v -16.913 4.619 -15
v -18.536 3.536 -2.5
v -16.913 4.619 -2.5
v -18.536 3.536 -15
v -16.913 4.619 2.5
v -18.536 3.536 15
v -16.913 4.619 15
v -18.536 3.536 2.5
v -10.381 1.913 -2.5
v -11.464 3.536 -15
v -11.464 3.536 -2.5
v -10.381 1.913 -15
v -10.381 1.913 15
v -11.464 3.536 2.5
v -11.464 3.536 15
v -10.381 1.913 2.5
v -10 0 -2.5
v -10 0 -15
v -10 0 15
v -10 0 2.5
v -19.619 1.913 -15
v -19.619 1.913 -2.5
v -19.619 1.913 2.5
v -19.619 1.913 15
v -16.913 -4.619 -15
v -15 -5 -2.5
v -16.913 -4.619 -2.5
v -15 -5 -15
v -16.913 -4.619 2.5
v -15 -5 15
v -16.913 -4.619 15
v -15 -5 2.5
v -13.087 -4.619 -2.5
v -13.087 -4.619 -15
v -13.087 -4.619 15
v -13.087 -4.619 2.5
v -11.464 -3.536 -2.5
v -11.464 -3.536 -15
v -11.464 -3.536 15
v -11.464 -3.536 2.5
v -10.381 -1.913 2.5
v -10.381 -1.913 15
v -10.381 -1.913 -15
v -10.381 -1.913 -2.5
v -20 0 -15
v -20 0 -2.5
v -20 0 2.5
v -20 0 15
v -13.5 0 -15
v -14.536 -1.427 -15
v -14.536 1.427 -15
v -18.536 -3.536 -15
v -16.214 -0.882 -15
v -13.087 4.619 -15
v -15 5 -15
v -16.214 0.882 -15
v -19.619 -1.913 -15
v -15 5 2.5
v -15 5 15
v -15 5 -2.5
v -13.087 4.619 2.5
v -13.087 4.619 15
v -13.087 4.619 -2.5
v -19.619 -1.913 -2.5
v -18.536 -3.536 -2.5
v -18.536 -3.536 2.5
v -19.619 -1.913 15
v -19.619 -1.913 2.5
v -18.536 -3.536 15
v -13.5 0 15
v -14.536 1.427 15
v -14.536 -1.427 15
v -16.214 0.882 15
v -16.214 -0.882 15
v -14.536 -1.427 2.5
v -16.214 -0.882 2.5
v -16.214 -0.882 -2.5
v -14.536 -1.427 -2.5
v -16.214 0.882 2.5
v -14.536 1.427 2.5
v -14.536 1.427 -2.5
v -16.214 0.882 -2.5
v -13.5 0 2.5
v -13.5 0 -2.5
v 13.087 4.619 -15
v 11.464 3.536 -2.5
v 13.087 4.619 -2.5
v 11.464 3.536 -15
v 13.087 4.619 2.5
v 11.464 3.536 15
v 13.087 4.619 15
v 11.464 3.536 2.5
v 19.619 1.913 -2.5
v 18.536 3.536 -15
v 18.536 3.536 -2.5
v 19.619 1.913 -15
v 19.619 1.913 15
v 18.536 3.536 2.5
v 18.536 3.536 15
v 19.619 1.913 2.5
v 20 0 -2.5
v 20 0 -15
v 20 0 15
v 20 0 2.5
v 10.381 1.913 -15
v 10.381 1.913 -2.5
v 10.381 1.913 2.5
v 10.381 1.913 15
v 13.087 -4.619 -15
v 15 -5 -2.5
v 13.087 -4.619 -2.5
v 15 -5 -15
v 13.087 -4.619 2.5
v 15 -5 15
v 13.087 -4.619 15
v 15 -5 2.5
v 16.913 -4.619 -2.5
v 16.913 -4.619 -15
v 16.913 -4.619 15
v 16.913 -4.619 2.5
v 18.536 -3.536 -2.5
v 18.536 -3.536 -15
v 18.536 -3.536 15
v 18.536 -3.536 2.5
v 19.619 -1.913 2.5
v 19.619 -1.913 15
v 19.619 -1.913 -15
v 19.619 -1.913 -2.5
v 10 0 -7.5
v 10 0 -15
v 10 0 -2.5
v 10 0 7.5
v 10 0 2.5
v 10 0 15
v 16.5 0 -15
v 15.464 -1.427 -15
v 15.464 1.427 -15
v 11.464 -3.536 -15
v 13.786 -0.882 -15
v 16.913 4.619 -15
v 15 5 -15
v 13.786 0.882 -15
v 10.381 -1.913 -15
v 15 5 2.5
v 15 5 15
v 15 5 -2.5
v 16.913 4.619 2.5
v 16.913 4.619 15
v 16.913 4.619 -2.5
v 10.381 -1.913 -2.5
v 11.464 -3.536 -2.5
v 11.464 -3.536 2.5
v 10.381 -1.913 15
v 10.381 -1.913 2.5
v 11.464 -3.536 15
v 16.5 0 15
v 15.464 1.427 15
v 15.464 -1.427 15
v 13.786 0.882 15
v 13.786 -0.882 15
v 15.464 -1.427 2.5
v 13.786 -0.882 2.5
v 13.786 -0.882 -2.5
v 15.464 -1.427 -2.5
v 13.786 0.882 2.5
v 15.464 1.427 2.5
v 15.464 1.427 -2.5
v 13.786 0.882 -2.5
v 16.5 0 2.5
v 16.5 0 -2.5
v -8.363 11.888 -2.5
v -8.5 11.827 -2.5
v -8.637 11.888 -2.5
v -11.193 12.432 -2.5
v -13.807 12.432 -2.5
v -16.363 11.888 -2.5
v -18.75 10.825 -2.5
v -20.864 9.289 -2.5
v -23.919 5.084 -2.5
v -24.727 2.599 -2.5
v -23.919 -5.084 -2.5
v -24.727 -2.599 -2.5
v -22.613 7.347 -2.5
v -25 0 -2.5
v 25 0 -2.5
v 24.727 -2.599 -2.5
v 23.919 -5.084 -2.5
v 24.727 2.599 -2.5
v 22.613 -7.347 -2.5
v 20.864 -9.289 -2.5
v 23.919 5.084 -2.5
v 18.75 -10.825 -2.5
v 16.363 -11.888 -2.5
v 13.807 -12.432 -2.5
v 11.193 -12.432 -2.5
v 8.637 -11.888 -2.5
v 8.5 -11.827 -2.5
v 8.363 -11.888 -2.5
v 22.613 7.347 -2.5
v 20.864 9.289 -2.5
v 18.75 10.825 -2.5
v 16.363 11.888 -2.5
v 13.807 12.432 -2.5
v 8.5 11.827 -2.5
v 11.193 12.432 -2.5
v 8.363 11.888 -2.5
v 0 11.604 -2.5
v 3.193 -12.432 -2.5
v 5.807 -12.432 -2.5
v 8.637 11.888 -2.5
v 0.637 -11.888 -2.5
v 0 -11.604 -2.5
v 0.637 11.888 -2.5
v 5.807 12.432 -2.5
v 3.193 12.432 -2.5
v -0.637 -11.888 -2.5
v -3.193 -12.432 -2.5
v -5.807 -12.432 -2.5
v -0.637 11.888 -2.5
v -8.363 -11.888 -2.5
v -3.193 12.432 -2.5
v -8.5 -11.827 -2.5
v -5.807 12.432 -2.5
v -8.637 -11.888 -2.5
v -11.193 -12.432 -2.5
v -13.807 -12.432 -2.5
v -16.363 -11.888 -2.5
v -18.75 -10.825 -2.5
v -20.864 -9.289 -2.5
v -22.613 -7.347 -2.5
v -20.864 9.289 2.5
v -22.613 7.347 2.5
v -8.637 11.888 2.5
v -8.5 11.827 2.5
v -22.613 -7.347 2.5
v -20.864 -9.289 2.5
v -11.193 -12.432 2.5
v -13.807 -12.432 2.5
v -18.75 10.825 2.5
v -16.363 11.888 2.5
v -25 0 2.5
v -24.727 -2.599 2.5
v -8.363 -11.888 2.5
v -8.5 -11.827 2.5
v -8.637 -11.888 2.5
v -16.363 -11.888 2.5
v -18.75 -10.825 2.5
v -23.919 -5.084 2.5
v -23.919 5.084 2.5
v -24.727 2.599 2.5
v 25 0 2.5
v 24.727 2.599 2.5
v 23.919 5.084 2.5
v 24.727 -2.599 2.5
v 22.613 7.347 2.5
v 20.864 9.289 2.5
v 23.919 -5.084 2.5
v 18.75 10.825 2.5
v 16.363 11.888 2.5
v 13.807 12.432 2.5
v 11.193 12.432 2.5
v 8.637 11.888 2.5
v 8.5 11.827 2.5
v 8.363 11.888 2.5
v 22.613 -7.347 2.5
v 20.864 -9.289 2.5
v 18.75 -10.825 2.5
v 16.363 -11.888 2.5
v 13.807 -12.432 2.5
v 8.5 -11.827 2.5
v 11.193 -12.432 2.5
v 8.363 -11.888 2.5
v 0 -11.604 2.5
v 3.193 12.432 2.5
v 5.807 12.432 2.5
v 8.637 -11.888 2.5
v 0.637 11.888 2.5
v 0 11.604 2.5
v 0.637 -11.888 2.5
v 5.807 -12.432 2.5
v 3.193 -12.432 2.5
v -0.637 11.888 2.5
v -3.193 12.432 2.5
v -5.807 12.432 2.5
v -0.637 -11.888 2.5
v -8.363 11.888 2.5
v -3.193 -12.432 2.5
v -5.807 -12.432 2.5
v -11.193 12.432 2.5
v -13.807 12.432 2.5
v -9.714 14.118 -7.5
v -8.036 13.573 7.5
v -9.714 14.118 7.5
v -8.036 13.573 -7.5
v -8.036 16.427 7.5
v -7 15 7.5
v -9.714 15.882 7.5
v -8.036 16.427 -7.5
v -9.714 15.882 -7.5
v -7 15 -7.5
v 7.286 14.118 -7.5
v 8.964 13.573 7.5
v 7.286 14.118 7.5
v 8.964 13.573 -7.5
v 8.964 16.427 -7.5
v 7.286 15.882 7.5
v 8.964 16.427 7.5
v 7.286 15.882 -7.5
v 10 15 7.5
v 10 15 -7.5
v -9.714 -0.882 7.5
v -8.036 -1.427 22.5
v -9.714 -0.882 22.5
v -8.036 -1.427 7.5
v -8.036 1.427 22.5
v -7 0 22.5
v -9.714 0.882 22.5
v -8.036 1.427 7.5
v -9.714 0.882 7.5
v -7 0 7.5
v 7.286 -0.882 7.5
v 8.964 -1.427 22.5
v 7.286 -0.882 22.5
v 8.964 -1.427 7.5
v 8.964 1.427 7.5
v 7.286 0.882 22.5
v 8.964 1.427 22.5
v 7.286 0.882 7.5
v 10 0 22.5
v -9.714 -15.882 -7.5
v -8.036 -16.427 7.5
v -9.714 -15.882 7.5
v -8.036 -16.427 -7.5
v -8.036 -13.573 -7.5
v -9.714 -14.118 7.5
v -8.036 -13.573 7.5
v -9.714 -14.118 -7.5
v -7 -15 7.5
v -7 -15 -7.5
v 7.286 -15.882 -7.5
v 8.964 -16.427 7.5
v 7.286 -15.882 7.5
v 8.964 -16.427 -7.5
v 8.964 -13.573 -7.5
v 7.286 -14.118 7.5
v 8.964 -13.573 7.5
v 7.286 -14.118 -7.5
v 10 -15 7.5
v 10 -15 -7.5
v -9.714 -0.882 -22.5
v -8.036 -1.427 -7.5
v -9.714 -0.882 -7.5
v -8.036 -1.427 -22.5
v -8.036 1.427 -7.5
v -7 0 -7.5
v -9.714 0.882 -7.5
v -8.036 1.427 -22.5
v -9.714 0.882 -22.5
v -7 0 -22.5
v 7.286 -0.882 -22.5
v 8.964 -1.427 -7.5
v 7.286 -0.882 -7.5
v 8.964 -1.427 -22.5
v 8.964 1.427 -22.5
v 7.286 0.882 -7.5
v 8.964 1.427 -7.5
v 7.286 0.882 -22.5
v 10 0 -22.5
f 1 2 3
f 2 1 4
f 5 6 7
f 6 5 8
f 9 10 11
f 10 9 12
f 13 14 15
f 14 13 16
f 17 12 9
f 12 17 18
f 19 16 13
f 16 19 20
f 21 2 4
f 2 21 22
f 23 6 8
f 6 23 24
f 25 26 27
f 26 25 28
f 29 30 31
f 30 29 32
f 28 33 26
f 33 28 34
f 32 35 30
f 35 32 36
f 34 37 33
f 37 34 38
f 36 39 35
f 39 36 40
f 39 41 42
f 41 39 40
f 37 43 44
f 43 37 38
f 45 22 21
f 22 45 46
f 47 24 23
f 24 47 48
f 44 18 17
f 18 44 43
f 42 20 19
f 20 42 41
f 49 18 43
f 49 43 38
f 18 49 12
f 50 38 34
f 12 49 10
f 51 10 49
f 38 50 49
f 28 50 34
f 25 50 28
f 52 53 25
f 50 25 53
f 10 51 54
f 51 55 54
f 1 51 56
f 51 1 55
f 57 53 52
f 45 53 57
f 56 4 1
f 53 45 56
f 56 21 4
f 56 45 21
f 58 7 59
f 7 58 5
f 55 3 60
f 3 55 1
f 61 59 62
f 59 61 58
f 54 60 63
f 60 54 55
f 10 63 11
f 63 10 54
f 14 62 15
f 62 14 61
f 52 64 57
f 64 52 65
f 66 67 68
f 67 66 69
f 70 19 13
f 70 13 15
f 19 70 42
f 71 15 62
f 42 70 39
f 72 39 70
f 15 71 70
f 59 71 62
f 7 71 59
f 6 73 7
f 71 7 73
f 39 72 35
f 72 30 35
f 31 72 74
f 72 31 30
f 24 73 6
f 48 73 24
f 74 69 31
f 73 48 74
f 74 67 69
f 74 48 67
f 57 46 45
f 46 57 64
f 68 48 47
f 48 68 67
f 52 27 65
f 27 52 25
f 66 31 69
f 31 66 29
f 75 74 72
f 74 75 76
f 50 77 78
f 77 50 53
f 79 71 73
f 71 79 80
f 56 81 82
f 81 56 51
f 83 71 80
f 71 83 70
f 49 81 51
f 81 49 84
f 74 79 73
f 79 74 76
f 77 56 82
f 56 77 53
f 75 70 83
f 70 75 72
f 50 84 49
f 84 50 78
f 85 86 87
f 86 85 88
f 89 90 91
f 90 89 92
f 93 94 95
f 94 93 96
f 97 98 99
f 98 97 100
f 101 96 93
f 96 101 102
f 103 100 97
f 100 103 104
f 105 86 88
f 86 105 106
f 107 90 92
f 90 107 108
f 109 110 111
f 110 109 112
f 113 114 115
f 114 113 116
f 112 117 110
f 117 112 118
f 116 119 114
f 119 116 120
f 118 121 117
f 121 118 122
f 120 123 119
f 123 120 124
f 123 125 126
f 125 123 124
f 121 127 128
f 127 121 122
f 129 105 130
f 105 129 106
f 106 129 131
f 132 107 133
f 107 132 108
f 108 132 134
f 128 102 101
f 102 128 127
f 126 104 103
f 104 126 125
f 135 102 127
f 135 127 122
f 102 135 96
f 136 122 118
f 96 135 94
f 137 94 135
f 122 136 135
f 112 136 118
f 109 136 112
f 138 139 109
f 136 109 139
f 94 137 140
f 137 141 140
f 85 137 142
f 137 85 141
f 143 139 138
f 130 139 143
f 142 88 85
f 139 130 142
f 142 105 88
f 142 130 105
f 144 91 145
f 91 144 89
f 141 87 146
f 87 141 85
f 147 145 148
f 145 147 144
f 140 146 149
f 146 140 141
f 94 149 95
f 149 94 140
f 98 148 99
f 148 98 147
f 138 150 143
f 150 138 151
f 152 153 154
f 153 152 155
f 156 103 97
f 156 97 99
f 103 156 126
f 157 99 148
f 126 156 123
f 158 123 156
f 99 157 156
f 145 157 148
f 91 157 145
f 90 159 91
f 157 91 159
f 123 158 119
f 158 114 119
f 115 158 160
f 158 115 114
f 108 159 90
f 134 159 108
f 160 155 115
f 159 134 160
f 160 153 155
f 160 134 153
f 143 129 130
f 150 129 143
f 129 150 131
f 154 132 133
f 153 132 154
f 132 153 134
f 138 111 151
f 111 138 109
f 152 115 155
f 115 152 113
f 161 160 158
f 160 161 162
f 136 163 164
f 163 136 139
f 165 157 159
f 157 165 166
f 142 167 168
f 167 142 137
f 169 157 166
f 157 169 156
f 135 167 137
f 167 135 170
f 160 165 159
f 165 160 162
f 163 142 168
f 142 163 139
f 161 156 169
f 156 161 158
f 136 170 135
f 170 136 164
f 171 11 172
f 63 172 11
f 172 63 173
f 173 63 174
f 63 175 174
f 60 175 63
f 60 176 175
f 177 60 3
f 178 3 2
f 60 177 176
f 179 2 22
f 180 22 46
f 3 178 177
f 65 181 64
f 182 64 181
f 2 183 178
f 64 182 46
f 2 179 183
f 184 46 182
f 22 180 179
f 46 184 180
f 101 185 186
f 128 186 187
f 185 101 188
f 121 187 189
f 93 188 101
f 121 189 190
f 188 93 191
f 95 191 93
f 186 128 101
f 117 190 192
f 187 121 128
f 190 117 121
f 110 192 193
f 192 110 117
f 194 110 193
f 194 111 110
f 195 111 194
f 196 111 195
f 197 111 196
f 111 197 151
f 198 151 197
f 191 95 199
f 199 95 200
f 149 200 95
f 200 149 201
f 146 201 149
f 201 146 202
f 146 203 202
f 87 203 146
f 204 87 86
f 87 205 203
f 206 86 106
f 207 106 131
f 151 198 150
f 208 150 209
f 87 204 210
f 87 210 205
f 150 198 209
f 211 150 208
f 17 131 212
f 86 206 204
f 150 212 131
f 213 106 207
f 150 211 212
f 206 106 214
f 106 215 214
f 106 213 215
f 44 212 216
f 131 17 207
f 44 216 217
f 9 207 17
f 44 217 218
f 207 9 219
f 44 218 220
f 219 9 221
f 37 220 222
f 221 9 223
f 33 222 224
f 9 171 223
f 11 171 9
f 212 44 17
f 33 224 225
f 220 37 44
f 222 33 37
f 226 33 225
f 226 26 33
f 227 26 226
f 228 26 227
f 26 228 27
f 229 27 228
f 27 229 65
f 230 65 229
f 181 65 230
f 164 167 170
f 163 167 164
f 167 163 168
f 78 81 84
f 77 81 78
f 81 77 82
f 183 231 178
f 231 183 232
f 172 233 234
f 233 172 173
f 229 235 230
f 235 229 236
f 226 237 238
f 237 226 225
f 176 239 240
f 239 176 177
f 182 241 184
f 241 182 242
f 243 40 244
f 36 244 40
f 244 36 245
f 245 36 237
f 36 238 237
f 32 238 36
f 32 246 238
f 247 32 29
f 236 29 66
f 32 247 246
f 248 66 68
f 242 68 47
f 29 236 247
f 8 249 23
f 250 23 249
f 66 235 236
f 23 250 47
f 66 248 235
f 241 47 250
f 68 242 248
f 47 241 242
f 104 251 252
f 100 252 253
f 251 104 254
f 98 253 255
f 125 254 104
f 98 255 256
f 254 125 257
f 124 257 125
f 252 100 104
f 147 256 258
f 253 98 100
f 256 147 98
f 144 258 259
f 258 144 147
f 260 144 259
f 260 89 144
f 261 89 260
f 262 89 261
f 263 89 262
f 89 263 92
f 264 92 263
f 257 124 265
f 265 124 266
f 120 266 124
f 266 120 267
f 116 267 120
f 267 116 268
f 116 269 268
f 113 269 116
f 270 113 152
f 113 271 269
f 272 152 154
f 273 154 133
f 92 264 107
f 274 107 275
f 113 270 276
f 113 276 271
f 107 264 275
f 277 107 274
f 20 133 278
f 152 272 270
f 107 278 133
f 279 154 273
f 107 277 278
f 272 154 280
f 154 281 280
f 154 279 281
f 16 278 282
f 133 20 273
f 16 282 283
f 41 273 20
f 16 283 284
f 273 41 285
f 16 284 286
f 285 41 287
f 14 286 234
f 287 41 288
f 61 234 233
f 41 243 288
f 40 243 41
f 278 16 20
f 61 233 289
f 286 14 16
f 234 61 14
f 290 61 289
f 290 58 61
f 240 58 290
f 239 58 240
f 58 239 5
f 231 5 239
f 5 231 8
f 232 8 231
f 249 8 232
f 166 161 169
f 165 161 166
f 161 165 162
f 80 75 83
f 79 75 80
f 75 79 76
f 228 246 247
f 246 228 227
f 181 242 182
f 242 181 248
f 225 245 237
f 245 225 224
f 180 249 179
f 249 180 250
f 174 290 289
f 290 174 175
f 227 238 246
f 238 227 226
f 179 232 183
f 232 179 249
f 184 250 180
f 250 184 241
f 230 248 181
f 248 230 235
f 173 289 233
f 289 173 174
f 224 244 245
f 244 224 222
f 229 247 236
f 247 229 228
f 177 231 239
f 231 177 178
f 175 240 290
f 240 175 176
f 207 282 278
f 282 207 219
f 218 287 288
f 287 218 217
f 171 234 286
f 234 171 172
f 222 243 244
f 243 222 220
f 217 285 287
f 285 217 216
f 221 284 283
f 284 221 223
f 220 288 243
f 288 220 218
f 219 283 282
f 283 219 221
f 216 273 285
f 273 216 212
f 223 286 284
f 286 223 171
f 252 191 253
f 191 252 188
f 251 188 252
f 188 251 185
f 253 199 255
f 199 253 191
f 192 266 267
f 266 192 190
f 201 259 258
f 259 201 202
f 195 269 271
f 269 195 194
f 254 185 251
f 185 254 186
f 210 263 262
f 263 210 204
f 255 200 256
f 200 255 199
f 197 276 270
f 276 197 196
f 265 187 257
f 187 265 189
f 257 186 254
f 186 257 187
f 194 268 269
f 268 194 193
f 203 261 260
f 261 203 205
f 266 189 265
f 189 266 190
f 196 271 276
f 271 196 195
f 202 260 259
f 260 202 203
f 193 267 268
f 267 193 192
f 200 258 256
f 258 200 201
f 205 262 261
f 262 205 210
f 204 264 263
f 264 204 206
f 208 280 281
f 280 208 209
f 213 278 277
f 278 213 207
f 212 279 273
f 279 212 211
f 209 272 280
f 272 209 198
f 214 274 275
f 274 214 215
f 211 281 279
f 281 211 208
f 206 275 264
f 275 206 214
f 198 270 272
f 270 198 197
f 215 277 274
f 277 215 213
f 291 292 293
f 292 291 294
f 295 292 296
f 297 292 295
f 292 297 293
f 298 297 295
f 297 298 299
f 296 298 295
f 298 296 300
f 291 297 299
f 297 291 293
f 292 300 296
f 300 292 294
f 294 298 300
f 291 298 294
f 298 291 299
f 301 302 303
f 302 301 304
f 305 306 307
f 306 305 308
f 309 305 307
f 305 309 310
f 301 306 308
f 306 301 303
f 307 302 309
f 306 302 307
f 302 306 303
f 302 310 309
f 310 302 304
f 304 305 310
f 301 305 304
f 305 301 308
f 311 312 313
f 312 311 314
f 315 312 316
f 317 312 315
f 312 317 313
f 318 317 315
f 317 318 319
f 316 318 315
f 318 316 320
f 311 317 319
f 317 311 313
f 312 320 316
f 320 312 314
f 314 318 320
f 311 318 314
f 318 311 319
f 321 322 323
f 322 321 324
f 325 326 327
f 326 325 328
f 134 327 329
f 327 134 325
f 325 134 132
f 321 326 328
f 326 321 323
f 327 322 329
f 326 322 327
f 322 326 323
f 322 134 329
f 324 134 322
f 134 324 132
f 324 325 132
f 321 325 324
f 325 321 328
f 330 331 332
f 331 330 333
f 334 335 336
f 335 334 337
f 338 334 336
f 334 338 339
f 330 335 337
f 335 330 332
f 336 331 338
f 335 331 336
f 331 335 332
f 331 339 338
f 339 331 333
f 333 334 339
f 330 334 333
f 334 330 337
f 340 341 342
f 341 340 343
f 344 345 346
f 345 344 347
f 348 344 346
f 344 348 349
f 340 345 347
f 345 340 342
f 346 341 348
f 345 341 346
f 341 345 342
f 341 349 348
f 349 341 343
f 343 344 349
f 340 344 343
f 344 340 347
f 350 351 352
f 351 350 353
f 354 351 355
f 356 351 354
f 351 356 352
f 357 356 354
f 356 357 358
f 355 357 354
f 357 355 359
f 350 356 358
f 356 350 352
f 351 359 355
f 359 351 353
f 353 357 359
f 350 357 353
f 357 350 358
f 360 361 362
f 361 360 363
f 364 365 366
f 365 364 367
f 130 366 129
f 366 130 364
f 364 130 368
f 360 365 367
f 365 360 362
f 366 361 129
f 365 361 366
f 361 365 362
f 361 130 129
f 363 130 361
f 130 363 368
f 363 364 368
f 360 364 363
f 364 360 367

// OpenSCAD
// Parameters
shaft_diameter = 10;
shaft_length = 30;
flange_diameter = 25;
flange_thickness = 5;
spacer_diameter = 20;
spacer_thickness = 3;
bolt_diameter = 3;
bolt_length = 15;
nut_diameter = 6;
nut_thickness = 3;
hole_spacing = 15;
num_bolts = 4;

// Function to create a shaft
module shaft(length) {
    difference() {
        cylinder(h=length, d=shaft_diameter, center=true);
        cylinder(h=length+2, d=bolt_diameter, center=true);
    }
}

// Function to create a flange plate
module flange_plate() {
    difference() {
        cylinder(h=flange_thickness, d=flange_diameter, center=true);
        cylinder(h=flange_thickness+2, d=bolt_diameter, center=true);
        for (i = [0:num_bolts-1]) {
            angle = i * 360 / num_bolts;
            translate([hole_spacing * cos(angle), hole_spacing * sin(angle), 0])
                cylinder(h=flange_thickness+2, d=bolt_diameter, center=true);
        }
    }
}

// Function to create a spacer ring
module spacer_ring() {
    difference() {
        cylinder(h=spacer_thickness, d=spacer_diameter, center=true);
        cylinder(h=spacer_thickness+2, d=bolt_diameter, center=true);
        for (i = [0:num_bolts-1]) {
            angle = i * 360 / num_bolts;
            translate([hole_spacing * cos(angle), hole_spacing * sin(angle), 0])
                cylinder(h=spacer_thickness+2, d=bolt_diameter, center=true);
        }
    }
}

// Function to create a bolt
module bolt() {
    cylinder(h=bolt_length, d=bolt_diameter, center=true);
}

// Function to create a nut
module nut() {
    cylinder(h=nut_thickness, d=nut_diameter, center=true);
}

// Assembly
module flexible_coupling() {
    translate([-shaft_length/2, 0, 0]) shaft(shaft_length);
    translate([shaft_length/2, 0, 0]) shaft(shaft_length);
    
    translate([-shaft_length/2 + flange_thickness/2, 0, 0]) flange_plate();
    translate([-shaft_length/2 + flange_thickness + spacer_thickness/2, 0, 0]) spacer_ring();
    translate([-shaft_length/2 + flange_thickness + spacer_thickness + flange_thickness/2, 0, 0]) flange_plate();
    
    translate([shaft_length/2 - flange_thickness/2, 0, 0]) flange_plate();
    translate([shaft_length/2 - flange_thickness - spacer_thickness/2, 0, 0]) spacer_ring();
    translate([shaft_length/2 - flange_thickness - spacer_thickness - flange_thickness/2, 0, 0]) flange_plate();
    
    for (i = [0:num_bolts-1]) {
        angle = i * 360 / num_bolts;
        translate([-shaft_length/2 + flange_thickness + spacer_thickness/2, hole_spacing * cos(angle), hole_spacing * sin(angle)])
            bolt();
        translate([shaft_length/2 - flange_thickness - spacer_thickness/2, hole_spacing * cos(angle), hole_spacing * sin(angle)])
            bolt();
    }
}

// Render the model
flexible_coupling();
